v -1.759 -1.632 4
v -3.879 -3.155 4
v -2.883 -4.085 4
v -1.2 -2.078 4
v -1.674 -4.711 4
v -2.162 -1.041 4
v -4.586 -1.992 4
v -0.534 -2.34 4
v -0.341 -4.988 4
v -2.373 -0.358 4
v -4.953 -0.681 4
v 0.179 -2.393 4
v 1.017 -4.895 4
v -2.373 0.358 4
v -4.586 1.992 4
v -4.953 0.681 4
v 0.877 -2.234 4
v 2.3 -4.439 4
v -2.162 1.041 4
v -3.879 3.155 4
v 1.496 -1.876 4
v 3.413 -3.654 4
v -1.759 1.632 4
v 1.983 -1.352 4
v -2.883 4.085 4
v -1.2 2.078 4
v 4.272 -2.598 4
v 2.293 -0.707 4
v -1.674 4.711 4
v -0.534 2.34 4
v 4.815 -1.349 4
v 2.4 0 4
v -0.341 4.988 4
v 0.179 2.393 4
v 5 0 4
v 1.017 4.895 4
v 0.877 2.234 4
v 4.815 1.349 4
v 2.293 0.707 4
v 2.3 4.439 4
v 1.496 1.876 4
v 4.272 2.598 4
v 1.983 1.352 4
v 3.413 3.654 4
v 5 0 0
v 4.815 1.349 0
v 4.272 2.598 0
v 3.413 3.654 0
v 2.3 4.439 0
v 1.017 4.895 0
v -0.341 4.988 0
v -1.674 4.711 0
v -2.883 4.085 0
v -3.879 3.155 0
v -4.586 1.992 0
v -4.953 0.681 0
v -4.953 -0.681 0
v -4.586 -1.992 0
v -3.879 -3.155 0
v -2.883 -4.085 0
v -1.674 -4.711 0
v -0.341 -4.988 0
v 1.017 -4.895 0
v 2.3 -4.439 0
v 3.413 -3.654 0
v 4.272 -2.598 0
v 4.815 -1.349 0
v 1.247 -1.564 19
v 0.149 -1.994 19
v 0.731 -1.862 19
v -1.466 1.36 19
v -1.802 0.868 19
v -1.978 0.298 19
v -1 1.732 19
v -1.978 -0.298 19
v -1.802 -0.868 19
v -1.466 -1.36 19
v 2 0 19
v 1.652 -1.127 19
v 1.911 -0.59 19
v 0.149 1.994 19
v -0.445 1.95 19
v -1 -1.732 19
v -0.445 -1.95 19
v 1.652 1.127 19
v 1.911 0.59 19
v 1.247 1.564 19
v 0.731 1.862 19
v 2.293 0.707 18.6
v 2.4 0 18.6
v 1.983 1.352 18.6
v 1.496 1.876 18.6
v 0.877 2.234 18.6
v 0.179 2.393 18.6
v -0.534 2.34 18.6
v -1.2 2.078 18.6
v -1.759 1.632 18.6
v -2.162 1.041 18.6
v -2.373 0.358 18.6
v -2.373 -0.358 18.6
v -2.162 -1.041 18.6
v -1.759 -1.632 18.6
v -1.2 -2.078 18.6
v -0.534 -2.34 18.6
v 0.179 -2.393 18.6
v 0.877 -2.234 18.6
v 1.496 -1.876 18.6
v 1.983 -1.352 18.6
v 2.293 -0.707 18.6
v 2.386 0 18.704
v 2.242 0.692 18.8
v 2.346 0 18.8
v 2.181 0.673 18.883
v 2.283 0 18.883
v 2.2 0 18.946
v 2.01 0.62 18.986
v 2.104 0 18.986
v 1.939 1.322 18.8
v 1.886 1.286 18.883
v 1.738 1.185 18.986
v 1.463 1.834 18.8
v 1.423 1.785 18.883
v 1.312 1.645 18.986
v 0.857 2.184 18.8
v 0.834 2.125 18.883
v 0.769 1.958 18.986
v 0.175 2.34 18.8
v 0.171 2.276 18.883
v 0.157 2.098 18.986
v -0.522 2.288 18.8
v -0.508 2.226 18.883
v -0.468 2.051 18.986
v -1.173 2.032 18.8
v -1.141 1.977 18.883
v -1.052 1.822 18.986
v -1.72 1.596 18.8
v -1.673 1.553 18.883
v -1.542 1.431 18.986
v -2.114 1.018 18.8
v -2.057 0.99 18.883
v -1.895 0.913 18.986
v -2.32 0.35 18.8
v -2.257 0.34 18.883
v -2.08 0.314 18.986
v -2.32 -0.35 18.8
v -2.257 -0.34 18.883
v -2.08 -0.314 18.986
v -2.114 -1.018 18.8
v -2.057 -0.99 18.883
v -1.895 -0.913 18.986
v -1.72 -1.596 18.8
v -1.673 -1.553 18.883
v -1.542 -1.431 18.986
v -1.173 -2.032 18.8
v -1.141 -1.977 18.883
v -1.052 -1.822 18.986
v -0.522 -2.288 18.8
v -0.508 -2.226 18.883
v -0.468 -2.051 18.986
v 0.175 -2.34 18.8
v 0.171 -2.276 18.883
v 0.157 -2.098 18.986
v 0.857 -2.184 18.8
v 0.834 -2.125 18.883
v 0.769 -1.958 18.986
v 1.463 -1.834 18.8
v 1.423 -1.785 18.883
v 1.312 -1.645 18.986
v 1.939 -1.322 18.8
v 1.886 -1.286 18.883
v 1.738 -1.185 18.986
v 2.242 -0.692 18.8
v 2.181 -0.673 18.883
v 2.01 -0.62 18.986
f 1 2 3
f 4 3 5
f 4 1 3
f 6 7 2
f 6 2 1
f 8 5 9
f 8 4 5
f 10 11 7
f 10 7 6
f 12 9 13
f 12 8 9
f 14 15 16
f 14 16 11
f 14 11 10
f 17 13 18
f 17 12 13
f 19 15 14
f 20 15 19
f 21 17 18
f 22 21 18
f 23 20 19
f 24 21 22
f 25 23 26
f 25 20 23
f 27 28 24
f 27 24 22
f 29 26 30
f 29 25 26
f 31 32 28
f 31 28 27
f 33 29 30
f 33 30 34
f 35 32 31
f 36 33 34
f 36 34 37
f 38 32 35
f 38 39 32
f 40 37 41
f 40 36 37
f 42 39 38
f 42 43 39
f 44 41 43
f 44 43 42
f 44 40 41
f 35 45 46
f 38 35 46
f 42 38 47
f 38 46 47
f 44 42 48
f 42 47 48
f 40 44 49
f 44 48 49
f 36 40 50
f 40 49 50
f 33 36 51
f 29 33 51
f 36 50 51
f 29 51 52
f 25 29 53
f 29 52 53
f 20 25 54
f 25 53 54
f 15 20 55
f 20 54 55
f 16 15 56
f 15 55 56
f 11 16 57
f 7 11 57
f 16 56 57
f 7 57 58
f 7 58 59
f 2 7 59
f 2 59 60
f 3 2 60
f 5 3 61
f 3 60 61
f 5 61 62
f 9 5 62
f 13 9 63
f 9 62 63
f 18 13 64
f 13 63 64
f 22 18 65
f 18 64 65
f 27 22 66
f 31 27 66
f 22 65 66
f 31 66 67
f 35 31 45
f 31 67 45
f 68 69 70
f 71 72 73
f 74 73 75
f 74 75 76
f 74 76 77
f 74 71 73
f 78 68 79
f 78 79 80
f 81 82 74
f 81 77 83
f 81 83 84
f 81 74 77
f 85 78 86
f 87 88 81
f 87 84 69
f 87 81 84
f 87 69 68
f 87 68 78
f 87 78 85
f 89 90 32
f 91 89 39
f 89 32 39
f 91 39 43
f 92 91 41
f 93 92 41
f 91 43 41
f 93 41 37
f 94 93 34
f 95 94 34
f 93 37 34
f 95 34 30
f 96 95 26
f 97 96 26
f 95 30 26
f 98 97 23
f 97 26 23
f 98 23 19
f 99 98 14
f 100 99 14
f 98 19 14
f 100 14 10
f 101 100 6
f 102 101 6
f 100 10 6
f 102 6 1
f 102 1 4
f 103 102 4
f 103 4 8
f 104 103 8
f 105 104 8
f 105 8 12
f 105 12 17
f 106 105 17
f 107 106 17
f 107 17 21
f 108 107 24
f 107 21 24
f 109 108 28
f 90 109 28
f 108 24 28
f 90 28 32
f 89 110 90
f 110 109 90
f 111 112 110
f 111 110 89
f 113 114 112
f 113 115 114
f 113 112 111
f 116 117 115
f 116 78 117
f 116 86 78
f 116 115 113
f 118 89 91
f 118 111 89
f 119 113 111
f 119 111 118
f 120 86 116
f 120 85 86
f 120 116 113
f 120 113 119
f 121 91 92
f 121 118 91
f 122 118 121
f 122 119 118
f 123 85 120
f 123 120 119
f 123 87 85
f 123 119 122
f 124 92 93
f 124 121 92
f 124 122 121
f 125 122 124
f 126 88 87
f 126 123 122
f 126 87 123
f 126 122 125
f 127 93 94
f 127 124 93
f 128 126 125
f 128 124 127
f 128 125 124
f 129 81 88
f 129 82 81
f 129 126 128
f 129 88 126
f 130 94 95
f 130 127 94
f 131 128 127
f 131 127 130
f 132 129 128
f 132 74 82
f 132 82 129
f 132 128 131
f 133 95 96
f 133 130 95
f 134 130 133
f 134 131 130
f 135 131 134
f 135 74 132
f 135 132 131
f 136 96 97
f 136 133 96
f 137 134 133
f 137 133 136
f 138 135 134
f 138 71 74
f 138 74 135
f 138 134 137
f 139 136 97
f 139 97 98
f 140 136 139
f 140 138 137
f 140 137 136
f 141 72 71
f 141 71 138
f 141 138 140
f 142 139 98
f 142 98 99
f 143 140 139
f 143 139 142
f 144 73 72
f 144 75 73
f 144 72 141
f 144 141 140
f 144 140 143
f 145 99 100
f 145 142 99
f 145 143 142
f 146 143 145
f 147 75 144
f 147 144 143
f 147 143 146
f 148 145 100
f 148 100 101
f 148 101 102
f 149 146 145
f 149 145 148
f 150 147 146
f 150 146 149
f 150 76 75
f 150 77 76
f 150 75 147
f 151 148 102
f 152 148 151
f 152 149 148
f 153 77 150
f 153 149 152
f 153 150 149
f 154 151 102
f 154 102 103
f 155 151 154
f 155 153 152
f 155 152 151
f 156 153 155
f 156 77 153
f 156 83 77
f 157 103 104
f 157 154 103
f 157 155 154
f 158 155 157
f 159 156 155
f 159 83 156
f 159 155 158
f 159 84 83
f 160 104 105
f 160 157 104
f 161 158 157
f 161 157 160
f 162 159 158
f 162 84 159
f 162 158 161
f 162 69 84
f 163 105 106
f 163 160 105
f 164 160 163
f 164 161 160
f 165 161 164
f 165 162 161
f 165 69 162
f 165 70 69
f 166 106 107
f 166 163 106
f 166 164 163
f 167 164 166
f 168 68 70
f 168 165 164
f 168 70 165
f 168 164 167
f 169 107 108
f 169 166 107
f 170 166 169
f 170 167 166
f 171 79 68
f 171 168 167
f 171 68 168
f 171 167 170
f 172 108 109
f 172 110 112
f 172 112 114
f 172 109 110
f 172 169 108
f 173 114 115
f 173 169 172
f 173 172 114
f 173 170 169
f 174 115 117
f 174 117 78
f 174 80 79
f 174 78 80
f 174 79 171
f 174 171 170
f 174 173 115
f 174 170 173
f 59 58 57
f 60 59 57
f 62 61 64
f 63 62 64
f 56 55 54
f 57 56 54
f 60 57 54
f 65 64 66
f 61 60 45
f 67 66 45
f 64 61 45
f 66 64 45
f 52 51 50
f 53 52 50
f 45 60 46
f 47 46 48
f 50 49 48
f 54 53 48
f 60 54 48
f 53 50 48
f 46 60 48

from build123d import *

# Parameters (mm, degrees)
ESQUISSE1_R        = 5
BOSS_EXTRU_1_DEPTH = 4
ESQUISSE2_R        = 2.4
BOSS_EXTRU_2_DEPTH = 15
CONG_1_R           = 0.4


with BuildPart() as part:
    # Esquisse1 → Boss.-Extru.1 (new body)
    with BuildSketch(Plane.XY):
        Circle(ESQUISSE1_R)
    extrude(amount=BOSS_EXTRU_1_DEPTH)

    # Esquisse2 → Boss.-Extru.2 (add)
    with BuildSketch(Plane.XY.offset(4)):
        Circle(ESQUISSE2_R)
    extrude(amount=BOSS_EXTRU_2_DEPTH)

    # Congé1
    cong_1_edges = [part.edges().sort_by_distance(p)[0] for p in [
        (-2.4, 0, 19),
    ]]
    fillet(cong_1_edges, radius=CONG_1_R)


solid = part.part
